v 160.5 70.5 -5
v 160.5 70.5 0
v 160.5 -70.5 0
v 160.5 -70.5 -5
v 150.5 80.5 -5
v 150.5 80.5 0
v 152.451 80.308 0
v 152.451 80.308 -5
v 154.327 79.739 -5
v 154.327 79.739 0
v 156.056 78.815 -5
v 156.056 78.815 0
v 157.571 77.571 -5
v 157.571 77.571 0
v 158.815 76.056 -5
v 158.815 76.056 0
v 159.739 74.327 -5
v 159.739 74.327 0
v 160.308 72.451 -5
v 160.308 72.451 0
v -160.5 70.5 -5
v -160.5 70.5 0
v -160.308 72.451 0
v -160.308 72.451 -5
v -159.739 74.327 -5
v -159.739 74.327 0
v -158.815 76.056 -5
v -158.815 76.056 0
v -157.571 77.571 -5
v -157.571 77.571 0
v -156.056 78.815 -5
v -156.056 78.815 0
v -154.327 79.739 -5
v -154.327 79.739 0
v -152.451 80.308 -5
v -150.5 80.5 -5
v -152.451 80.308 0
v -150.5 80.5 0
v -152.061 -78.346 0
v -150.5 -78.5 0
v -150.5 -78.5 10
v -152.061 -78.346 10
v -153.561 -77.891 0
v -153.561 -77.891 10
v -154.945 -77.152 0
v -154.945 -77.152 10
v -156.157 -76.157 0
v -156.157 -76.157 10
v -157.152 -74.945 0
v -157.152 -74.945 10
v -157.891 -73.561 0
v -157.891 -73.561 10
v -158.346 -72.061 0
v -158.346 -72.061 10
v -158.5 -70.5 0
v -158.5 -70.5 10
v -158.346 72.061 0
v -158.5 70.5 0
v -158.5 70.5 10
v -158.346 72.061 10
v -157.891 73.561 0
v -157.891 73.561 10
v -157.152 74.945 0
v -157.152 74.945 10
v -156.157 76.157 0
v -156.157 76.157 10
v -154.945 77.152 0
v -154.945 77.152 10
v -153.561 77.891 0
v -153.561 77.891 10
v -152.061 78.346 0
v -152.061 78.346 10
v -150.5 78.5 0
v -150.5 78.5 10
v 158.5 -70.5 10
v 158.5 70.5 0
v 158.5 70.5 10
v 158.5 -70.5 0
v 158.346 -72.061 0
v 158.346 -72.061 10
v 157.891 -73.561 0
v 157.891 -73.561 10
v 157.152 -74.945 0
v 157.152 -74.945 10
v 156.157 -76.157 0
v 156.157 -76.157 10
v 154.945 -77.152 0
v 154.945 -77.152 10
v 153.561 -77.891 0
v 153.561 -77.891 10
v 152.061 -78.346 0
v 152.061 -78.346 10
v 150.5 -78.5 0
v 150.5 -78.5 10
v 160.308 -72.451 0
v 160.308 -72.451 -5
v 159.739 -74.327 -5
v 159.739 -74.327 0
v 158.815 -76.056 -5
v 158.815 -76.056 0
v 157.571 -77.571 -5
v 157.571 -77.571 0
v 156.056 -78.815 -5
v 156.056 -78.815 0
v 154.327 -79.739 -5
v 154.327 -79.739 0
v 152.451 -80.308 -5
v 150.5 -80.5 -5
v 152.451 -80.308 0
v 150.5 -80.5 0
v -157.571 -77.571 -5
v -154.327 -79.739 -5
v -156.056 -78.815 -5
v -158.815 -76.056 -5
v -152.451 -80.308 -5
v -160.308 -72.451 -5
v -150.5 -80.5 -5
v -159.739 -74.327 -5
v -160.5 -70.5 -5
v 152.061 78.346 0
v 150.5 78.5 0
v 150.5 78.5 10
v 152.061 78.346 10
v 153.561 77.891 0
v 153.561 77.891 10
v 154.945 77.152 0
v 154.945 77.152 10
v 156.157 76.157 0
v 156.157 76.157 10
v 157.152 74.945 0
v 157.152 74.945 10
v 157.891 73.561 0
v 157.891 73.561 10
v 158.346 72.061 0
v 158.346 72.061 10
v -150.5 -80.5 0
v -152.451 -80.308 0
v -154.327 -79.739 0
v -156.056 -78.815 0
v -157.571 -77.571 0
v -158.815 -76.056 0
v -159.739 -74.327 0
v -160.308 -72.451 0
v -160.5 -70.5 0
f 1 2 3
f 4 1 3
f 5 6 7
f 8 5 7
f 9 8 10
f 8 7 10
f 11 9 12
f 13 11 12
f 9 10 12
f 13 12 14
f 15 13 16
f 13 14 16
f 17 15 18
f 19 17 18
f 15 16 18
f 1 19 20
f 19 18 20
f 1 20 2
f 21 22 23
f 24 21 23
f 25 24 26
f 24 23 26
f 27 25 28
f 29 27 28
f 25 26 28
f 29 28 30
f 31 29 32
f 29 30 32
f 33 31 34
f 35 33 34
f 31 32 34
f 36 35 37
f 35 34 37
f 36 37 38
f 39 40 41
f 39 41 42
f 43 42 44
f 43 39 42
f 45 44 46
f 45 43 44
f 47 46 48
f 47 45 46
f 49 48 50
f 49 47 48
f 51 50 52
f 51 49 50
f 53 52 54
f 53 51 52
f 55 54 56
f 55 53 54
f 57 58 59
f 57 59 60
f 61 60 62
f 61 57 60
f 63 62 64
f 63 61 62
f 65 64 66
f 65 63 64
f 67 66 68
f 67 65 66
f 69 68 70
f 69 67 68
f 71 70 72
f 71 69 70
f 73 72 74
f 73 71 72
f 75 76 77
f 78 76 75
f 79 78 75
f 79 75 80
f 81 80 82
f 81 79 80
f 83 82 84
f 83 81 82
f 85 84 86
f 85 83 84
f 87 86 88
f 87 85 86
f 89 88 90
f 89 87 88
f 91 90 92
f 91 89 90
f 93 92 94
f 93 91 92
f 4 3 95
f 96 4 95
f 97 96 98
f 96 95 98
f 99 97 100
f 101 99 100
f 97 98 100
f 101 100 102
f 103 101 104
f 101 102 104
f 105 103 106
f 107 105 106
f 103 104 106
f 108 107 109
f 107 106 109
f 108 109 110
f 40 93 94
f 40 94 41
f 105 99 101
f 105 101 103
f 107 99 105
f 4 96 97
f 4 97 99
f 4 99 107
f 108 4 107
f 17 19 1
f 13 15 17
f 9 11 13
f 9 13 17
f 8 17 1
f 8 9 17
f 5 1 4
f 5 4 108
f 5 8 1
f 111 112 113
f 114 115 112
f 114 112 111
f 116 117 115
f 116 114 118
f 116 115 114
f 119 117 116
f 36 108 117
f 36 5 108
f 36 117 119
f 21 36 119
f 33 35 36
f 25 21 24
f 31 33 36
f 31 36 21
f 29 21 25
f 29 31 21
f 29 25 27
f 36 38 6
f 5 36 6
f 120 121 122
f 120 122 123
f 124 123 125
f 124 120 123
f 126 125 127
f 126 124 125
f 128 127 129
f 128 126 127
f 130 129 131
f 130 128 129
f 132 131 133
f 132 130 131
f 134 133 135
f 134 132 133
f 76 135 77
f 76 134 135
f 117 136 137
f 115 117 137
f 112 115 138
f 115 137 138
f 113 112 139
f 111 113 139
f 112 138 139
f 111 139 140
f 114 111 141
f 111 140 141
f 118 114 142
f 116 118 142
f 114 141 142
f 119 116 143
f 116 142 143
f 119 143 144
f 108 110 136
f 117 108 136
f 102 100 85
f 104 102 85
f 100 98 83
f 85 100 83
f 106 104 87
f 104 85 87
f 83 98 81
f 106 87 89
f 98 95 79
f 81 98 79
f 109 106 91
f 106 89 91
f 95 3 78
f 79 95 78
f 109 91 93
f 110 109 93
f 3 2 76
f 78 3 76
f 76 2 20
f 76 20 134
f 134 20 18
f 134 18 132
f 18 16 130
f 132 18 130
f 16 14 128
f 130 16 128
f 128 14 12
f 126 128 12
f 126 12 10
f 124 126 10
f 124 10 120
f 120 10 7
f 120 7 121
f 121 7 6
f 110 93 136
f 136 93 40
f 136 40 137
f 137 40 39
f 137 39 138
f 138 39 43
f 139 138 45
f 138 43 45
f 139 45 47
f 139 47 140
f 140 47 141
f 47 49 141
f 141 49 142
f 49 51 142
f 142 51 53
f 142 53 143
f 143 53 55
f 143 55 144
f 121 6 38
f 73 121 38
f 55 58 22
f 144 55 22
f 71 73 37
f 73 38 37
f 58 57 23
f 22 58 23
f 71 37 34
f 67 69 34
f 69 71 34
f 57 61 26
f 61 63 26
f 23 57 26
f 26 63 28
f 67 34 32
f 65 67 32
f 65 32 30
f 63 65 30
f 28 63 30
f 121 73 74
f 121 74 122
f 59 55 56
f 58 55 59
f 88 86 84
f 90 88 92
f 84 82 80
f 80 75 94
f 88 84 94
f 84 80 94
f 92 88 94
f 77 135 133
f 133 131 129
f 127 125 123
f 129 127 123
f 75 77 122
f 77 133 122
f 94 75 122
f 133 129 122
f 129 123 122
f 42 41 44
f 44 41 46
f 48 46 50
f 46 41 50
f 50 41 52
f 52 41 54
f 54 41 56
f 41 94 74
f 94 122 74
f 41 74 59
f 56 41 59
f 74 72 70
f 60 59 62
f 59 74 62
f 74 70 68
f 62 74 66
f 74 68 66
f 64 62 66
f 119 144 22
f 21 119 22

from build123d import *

# Parameters (mm, degrees)
BOSS_EXTRUDE2_DEPTH = 5
EXTRUDE_1_DEPTH     = 10


with BuildPart() as part:
    # Sketch3 → Boss-Extrude2 (new body)
    with BuildSketch(Plane.XY):
        with BuildLine():
            Line((-150.5, 80.5), (150.5, 80.5))
            ThreePointArc((150.5, 80.5), (157.571067812, 77.571067812), (160.5, 70.5))
            Line((160.5, 70.5), (160.5, -70.5))
            ThreePointArc((160.5, -70.5), (157.571067812, -77.571067812), (150.5, -80.5))
            Line((150.5, -80.5), (-150.5, -80.5))
            ThreePointArc((-150.5, -80.5), (-157.571067812, -77.571067812), (-160.5, -70.5))
            Line((-160.5, -70.5), (-160.5, 70.5))
            ThreePointArc((-160.5, 70.5), (-157.571067812, 77.571067812), (-150.5, 80.5))
        make_face()
    extrude(amount=-BOSS_EXTRUDE2_DEPTH)

    # Эскиз1 → Бобышка-Вытянуть1 (add)
    with BuildSketch(Plane(origin=(0, 0, 0), x_dir=(-1, 0, 0), z_dir=(0, 0, -1))):
        with BuildLine():
            Line((-150.5, -78.5), (150.5, -78.5))
            ThreePointArc((150.5, -78.5), (156.156854249, -76.156854249), (158.5, -70.5))
            Line((158.5, -70.5), (158.5, 70.5))
            ThreePointArc((158.5, 70.5), (156.156854249, 76.156854249), (150.5, 78.5))
            Line((150.5, 78.5), (-150.5, 78.5))
            ThreePointArc((-150.5, 78.5), (-156.156854249, 76.156854249), (-158.5, 70.5))
            Line((-158.5, 70.5), (-158.5, -70.5))
            ThreePointArc((-158.5, -70.5), (-156.156854249, -76.156854249), (-150.5, -78.5))
        make_face()
    extrude(amount=-EXTRUDE_1_DEPTH)


solid = part.part
